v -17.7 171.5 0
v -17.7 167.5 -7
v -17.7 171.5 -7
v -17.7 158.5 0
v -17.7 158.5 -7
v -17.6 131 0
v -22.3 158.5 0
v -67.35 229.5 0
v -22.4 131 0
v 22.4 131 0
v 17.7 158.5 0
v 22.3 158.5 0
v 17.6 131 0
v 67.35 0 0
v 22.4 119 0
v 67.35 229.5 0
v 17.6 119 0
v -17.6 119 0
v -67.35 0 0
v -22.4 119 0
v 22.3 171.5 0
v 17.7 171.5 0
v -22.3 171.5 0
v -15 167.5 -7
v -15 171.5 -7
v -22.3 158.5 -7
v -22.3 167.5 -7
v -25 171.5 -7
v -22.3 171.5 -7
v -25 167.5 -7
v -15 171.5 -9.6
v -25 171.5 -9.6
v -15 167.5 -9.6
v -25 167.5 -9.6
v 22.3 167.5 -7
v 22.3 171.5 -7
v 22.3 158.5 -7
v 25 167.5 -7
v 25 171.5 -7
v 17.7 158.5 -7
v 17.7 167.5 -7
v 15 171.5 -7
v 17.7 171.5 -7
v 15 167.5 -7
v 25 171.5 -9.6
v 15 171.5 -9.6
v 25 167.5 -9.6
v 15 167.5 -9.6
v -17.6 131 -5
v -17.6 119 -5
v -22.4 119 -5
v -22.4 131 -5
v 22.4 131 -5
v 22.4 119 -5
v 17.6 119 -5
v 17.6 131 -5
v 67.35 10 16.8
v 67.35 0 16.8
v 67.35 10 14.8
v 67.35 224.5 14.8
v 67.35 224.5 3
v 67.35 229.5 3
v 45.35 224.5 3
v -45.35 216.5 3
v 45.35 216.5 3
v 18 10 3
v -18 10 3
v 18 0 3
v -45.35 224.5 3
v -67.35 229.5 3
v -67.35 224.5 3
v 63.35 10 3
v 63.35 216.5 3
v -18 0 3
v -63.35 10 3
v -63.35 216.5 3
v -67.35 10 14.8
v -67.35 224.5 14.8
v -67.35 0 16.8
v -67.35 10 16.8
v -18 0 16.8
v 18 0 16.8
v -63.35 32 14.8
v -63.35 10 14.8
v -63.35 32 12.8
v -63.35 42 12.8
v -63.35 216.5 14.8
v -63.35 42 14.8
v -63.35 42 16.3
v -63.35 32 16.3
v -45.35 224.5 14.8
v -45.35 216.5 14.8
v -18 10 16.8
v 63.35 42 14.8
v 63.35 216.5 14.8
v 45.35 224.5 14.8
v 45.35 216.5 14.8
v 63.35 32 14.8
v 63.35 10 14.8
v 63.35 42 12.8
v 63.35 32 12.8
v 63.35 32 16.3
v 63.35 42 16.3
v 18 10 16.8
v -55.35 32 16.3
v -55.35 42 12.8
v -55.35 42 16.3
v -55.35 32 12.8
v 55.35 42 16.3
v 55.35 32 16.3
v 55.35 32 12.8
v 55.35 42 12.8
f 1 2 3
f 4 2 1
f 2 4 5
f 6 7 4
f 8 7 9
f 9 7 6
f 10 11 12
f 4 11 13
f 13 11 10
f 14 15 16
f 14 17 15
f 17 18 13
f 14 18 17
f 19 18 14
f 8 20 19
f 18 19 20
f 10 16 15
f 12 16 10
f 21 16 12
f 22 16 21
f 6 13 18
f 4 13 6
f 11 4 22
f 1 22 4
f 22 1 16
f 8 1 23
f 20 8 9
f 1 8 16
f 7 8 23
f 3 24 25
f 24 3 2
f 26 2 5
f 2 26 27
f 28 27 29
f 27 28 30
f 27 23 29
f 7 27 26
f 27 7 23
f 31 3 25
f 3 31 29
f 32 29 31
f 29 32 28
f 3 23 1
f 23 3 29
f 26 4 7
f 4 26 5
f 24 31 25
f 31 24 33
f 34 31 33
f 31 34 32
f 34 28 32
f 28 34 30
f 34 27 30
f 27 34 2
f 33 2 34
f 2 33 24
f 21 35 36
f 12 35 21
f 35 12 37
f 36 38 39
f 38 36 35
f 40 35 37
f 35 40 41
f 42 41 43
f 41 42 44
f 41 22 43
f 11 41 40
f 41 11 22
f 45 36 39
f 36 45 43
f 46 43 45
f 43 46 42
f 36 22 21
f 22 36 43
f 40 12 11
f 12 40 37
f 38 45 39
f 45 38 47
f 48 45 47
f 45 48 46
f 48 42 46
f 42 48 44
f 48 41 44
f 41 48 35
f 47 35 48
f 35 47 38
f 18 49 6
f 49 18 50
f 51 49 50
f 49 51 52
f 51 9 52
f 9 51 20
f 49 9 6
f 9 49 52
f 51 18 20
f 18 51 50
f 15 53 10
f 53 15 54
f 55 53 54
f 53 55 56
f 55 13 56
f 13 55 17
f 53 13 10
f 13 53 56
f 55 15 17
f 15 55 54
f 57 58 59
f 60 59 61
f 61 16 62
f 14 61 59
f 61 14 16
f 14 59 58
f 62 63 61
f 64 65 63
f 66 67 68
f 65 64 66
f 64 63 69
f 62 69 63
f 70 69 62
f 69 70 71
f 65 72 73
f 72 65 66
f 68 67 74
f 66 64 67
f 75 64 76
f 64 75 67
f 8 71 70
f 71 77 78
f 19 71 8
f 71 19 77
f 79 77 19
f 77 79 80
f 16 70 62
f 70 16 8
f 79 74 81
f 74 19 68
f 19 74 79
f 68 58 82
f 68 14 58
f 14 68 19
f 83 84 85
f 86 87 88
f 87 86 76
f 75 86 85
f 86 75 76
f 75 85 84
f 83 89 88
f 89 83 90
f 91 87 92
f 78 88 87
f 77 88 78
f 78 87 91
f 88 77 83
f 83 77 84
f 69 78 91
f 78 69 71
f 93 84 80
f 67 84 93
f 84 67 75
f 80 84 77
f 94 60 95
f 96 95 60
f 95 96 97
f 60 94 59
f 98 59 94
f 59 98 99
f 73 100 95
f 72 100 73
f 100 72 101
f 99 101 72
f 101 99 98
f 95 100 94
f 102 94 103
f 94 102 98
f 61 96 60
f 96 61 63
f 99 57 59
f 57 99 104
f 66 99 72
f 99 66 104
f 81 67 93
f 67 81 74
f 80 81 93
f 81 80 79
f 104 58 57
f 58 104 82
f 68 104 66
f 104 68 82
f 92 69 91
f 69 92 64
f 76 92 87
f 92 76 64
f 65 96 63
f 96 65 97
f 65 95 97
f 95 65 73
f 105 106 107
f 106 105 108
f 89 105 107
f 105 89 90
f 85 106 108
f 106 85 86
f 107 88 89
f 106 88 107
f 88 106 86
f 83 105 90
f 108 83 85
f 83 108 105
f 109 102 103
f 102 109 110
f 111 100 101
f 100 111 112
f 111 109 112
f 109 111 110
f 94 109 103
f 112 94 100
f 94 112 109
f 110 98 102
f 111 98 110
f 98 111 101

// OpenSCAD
// Samsung Galaxy Tab A7 Lite wall cradle for IKEA SKADIS.
// Units: millimeters.

tablet_h = 212.5;
tablet_w = 124.7;
tablet_d = 8.0;

side_clearance = 1.0;
depth_clearance = 0.8;

back_thickness = 3.0;
rail_width = 4.0;
rail_front_depth = tablet_d + depth_clearance + 3.0;
bottom_lip_h = 10.0;
top_retainer_h = 8.0;
outer_margin = 5.0;

grid = 40.0;
hook_w = 4.6;
hook_h = 13.0;
hook_depth = 7.0;
hook_cap_w = 10.0;
hook_cap_h = 4.0;
hook_cap_depth = 2.6;
peg_w = 4.8;
peg_h = 12.0;
peg_depth = 5.0;

pocket_w = tablet_w + side_clearance * 2;
pocket_h = tablet_h + side_clearance * 2;
outer_w = pocket_w + rail_width * 2;
outer_h = pocket_h + outer_margin + bottom_lip_h;

x0 = -outer_w / 2;
x1 = outer_w / 2;
pocket_x0 = -pocket_w / 2;
pocket_x1 = pocket_w / 2;
pocket_y0 = bottom_lip_h;
pocket_y1 = bottom_lip_h + pocket_h;
z_front = back_thickness;
z_lip = back_thickness + rail_front_depth;

module box(x0, x1, y0, y1, z0, z1) {
  translate([x0, y0, z0]) cube([x1 - x0, y1 - y0, z1 - z0], center = false);
}

module skadis_hook(cx, cy) {
  box(cx - hook_w / 2, cx + hook_w / 2, cy - hook_h / 2, cy + hook_h / 2, -hook_depth, 0);
  box(cx - hook_cap_w / 2, cx + hook_cap_w / 2, cy + hook_h / 2 - hook_cap_h, cy + hook_h / 2, -hook_depth - hook_cap_depth, -hook_depth);
}

module skadis_peg(cx, cy) {
  box(cx - peg_w / 2, cx + peg_w / 2, cy - peg_h / 2, cy + peg_h / 2, -peg_depth, 0);
}

union() {
  // Back plate.
  box(x0, x1, 0, outer_h, 0, back_thickness);

  // Side rails.
  box(x0, pocket_x0, pocket_y0, pocket_y1, z_front, z_lip);
  box(pocket_x1, x1, pocket_y0, pocket_y1, z_front, z_lip);

  // Bottom lip split for USB-C cable clearance.
  cable_gap = 36.0;
  box(x0, -cable_gap / 2, 0, bottom_lip_h, z_front, z_lip + 2.0);
  box(cable_gap / 2, x1, 0, bottom_lip_h, z_front, z_lip + 2.0);

  // Top corner retainers.
  retainer_w = 22.0;
  box(x0, x0 + retainer_w, pocket_y1 - top_retainer_h, pocket_y1, z_front, z_lip);
  box(x1 - retainer_w, x1, pocket_y1 - top_retainer_h, pocket_y1, z_front, z_lip);

  // Low anti-rattle nubs.
  nub_h = 10.0;
  nub_w = 8.0;
  box(pocket_x0, pocket_x0 + nub_w, pocket_y0 + 22, pocket_y0 + 22 + nub_h, z_lip - 2.0, z_lip + 1.5);
  box(pocket_x1 - nub_w, pocket_x1, pocket_y0 + 22, pocket_y0 + 22 + nub_h, z_lip - 2.0, z_lip + 1.5);

  // SKADIS load hooks and lower stabilizer pegs.
  top_y = 165.0;
  bottom_y = top_y - grid;
  for (cx = [-grid / 2, grid / 2]) {
    skadis_hook(cx, top_y);
    skadis_peg(cx, bottom_y);
  }
}
